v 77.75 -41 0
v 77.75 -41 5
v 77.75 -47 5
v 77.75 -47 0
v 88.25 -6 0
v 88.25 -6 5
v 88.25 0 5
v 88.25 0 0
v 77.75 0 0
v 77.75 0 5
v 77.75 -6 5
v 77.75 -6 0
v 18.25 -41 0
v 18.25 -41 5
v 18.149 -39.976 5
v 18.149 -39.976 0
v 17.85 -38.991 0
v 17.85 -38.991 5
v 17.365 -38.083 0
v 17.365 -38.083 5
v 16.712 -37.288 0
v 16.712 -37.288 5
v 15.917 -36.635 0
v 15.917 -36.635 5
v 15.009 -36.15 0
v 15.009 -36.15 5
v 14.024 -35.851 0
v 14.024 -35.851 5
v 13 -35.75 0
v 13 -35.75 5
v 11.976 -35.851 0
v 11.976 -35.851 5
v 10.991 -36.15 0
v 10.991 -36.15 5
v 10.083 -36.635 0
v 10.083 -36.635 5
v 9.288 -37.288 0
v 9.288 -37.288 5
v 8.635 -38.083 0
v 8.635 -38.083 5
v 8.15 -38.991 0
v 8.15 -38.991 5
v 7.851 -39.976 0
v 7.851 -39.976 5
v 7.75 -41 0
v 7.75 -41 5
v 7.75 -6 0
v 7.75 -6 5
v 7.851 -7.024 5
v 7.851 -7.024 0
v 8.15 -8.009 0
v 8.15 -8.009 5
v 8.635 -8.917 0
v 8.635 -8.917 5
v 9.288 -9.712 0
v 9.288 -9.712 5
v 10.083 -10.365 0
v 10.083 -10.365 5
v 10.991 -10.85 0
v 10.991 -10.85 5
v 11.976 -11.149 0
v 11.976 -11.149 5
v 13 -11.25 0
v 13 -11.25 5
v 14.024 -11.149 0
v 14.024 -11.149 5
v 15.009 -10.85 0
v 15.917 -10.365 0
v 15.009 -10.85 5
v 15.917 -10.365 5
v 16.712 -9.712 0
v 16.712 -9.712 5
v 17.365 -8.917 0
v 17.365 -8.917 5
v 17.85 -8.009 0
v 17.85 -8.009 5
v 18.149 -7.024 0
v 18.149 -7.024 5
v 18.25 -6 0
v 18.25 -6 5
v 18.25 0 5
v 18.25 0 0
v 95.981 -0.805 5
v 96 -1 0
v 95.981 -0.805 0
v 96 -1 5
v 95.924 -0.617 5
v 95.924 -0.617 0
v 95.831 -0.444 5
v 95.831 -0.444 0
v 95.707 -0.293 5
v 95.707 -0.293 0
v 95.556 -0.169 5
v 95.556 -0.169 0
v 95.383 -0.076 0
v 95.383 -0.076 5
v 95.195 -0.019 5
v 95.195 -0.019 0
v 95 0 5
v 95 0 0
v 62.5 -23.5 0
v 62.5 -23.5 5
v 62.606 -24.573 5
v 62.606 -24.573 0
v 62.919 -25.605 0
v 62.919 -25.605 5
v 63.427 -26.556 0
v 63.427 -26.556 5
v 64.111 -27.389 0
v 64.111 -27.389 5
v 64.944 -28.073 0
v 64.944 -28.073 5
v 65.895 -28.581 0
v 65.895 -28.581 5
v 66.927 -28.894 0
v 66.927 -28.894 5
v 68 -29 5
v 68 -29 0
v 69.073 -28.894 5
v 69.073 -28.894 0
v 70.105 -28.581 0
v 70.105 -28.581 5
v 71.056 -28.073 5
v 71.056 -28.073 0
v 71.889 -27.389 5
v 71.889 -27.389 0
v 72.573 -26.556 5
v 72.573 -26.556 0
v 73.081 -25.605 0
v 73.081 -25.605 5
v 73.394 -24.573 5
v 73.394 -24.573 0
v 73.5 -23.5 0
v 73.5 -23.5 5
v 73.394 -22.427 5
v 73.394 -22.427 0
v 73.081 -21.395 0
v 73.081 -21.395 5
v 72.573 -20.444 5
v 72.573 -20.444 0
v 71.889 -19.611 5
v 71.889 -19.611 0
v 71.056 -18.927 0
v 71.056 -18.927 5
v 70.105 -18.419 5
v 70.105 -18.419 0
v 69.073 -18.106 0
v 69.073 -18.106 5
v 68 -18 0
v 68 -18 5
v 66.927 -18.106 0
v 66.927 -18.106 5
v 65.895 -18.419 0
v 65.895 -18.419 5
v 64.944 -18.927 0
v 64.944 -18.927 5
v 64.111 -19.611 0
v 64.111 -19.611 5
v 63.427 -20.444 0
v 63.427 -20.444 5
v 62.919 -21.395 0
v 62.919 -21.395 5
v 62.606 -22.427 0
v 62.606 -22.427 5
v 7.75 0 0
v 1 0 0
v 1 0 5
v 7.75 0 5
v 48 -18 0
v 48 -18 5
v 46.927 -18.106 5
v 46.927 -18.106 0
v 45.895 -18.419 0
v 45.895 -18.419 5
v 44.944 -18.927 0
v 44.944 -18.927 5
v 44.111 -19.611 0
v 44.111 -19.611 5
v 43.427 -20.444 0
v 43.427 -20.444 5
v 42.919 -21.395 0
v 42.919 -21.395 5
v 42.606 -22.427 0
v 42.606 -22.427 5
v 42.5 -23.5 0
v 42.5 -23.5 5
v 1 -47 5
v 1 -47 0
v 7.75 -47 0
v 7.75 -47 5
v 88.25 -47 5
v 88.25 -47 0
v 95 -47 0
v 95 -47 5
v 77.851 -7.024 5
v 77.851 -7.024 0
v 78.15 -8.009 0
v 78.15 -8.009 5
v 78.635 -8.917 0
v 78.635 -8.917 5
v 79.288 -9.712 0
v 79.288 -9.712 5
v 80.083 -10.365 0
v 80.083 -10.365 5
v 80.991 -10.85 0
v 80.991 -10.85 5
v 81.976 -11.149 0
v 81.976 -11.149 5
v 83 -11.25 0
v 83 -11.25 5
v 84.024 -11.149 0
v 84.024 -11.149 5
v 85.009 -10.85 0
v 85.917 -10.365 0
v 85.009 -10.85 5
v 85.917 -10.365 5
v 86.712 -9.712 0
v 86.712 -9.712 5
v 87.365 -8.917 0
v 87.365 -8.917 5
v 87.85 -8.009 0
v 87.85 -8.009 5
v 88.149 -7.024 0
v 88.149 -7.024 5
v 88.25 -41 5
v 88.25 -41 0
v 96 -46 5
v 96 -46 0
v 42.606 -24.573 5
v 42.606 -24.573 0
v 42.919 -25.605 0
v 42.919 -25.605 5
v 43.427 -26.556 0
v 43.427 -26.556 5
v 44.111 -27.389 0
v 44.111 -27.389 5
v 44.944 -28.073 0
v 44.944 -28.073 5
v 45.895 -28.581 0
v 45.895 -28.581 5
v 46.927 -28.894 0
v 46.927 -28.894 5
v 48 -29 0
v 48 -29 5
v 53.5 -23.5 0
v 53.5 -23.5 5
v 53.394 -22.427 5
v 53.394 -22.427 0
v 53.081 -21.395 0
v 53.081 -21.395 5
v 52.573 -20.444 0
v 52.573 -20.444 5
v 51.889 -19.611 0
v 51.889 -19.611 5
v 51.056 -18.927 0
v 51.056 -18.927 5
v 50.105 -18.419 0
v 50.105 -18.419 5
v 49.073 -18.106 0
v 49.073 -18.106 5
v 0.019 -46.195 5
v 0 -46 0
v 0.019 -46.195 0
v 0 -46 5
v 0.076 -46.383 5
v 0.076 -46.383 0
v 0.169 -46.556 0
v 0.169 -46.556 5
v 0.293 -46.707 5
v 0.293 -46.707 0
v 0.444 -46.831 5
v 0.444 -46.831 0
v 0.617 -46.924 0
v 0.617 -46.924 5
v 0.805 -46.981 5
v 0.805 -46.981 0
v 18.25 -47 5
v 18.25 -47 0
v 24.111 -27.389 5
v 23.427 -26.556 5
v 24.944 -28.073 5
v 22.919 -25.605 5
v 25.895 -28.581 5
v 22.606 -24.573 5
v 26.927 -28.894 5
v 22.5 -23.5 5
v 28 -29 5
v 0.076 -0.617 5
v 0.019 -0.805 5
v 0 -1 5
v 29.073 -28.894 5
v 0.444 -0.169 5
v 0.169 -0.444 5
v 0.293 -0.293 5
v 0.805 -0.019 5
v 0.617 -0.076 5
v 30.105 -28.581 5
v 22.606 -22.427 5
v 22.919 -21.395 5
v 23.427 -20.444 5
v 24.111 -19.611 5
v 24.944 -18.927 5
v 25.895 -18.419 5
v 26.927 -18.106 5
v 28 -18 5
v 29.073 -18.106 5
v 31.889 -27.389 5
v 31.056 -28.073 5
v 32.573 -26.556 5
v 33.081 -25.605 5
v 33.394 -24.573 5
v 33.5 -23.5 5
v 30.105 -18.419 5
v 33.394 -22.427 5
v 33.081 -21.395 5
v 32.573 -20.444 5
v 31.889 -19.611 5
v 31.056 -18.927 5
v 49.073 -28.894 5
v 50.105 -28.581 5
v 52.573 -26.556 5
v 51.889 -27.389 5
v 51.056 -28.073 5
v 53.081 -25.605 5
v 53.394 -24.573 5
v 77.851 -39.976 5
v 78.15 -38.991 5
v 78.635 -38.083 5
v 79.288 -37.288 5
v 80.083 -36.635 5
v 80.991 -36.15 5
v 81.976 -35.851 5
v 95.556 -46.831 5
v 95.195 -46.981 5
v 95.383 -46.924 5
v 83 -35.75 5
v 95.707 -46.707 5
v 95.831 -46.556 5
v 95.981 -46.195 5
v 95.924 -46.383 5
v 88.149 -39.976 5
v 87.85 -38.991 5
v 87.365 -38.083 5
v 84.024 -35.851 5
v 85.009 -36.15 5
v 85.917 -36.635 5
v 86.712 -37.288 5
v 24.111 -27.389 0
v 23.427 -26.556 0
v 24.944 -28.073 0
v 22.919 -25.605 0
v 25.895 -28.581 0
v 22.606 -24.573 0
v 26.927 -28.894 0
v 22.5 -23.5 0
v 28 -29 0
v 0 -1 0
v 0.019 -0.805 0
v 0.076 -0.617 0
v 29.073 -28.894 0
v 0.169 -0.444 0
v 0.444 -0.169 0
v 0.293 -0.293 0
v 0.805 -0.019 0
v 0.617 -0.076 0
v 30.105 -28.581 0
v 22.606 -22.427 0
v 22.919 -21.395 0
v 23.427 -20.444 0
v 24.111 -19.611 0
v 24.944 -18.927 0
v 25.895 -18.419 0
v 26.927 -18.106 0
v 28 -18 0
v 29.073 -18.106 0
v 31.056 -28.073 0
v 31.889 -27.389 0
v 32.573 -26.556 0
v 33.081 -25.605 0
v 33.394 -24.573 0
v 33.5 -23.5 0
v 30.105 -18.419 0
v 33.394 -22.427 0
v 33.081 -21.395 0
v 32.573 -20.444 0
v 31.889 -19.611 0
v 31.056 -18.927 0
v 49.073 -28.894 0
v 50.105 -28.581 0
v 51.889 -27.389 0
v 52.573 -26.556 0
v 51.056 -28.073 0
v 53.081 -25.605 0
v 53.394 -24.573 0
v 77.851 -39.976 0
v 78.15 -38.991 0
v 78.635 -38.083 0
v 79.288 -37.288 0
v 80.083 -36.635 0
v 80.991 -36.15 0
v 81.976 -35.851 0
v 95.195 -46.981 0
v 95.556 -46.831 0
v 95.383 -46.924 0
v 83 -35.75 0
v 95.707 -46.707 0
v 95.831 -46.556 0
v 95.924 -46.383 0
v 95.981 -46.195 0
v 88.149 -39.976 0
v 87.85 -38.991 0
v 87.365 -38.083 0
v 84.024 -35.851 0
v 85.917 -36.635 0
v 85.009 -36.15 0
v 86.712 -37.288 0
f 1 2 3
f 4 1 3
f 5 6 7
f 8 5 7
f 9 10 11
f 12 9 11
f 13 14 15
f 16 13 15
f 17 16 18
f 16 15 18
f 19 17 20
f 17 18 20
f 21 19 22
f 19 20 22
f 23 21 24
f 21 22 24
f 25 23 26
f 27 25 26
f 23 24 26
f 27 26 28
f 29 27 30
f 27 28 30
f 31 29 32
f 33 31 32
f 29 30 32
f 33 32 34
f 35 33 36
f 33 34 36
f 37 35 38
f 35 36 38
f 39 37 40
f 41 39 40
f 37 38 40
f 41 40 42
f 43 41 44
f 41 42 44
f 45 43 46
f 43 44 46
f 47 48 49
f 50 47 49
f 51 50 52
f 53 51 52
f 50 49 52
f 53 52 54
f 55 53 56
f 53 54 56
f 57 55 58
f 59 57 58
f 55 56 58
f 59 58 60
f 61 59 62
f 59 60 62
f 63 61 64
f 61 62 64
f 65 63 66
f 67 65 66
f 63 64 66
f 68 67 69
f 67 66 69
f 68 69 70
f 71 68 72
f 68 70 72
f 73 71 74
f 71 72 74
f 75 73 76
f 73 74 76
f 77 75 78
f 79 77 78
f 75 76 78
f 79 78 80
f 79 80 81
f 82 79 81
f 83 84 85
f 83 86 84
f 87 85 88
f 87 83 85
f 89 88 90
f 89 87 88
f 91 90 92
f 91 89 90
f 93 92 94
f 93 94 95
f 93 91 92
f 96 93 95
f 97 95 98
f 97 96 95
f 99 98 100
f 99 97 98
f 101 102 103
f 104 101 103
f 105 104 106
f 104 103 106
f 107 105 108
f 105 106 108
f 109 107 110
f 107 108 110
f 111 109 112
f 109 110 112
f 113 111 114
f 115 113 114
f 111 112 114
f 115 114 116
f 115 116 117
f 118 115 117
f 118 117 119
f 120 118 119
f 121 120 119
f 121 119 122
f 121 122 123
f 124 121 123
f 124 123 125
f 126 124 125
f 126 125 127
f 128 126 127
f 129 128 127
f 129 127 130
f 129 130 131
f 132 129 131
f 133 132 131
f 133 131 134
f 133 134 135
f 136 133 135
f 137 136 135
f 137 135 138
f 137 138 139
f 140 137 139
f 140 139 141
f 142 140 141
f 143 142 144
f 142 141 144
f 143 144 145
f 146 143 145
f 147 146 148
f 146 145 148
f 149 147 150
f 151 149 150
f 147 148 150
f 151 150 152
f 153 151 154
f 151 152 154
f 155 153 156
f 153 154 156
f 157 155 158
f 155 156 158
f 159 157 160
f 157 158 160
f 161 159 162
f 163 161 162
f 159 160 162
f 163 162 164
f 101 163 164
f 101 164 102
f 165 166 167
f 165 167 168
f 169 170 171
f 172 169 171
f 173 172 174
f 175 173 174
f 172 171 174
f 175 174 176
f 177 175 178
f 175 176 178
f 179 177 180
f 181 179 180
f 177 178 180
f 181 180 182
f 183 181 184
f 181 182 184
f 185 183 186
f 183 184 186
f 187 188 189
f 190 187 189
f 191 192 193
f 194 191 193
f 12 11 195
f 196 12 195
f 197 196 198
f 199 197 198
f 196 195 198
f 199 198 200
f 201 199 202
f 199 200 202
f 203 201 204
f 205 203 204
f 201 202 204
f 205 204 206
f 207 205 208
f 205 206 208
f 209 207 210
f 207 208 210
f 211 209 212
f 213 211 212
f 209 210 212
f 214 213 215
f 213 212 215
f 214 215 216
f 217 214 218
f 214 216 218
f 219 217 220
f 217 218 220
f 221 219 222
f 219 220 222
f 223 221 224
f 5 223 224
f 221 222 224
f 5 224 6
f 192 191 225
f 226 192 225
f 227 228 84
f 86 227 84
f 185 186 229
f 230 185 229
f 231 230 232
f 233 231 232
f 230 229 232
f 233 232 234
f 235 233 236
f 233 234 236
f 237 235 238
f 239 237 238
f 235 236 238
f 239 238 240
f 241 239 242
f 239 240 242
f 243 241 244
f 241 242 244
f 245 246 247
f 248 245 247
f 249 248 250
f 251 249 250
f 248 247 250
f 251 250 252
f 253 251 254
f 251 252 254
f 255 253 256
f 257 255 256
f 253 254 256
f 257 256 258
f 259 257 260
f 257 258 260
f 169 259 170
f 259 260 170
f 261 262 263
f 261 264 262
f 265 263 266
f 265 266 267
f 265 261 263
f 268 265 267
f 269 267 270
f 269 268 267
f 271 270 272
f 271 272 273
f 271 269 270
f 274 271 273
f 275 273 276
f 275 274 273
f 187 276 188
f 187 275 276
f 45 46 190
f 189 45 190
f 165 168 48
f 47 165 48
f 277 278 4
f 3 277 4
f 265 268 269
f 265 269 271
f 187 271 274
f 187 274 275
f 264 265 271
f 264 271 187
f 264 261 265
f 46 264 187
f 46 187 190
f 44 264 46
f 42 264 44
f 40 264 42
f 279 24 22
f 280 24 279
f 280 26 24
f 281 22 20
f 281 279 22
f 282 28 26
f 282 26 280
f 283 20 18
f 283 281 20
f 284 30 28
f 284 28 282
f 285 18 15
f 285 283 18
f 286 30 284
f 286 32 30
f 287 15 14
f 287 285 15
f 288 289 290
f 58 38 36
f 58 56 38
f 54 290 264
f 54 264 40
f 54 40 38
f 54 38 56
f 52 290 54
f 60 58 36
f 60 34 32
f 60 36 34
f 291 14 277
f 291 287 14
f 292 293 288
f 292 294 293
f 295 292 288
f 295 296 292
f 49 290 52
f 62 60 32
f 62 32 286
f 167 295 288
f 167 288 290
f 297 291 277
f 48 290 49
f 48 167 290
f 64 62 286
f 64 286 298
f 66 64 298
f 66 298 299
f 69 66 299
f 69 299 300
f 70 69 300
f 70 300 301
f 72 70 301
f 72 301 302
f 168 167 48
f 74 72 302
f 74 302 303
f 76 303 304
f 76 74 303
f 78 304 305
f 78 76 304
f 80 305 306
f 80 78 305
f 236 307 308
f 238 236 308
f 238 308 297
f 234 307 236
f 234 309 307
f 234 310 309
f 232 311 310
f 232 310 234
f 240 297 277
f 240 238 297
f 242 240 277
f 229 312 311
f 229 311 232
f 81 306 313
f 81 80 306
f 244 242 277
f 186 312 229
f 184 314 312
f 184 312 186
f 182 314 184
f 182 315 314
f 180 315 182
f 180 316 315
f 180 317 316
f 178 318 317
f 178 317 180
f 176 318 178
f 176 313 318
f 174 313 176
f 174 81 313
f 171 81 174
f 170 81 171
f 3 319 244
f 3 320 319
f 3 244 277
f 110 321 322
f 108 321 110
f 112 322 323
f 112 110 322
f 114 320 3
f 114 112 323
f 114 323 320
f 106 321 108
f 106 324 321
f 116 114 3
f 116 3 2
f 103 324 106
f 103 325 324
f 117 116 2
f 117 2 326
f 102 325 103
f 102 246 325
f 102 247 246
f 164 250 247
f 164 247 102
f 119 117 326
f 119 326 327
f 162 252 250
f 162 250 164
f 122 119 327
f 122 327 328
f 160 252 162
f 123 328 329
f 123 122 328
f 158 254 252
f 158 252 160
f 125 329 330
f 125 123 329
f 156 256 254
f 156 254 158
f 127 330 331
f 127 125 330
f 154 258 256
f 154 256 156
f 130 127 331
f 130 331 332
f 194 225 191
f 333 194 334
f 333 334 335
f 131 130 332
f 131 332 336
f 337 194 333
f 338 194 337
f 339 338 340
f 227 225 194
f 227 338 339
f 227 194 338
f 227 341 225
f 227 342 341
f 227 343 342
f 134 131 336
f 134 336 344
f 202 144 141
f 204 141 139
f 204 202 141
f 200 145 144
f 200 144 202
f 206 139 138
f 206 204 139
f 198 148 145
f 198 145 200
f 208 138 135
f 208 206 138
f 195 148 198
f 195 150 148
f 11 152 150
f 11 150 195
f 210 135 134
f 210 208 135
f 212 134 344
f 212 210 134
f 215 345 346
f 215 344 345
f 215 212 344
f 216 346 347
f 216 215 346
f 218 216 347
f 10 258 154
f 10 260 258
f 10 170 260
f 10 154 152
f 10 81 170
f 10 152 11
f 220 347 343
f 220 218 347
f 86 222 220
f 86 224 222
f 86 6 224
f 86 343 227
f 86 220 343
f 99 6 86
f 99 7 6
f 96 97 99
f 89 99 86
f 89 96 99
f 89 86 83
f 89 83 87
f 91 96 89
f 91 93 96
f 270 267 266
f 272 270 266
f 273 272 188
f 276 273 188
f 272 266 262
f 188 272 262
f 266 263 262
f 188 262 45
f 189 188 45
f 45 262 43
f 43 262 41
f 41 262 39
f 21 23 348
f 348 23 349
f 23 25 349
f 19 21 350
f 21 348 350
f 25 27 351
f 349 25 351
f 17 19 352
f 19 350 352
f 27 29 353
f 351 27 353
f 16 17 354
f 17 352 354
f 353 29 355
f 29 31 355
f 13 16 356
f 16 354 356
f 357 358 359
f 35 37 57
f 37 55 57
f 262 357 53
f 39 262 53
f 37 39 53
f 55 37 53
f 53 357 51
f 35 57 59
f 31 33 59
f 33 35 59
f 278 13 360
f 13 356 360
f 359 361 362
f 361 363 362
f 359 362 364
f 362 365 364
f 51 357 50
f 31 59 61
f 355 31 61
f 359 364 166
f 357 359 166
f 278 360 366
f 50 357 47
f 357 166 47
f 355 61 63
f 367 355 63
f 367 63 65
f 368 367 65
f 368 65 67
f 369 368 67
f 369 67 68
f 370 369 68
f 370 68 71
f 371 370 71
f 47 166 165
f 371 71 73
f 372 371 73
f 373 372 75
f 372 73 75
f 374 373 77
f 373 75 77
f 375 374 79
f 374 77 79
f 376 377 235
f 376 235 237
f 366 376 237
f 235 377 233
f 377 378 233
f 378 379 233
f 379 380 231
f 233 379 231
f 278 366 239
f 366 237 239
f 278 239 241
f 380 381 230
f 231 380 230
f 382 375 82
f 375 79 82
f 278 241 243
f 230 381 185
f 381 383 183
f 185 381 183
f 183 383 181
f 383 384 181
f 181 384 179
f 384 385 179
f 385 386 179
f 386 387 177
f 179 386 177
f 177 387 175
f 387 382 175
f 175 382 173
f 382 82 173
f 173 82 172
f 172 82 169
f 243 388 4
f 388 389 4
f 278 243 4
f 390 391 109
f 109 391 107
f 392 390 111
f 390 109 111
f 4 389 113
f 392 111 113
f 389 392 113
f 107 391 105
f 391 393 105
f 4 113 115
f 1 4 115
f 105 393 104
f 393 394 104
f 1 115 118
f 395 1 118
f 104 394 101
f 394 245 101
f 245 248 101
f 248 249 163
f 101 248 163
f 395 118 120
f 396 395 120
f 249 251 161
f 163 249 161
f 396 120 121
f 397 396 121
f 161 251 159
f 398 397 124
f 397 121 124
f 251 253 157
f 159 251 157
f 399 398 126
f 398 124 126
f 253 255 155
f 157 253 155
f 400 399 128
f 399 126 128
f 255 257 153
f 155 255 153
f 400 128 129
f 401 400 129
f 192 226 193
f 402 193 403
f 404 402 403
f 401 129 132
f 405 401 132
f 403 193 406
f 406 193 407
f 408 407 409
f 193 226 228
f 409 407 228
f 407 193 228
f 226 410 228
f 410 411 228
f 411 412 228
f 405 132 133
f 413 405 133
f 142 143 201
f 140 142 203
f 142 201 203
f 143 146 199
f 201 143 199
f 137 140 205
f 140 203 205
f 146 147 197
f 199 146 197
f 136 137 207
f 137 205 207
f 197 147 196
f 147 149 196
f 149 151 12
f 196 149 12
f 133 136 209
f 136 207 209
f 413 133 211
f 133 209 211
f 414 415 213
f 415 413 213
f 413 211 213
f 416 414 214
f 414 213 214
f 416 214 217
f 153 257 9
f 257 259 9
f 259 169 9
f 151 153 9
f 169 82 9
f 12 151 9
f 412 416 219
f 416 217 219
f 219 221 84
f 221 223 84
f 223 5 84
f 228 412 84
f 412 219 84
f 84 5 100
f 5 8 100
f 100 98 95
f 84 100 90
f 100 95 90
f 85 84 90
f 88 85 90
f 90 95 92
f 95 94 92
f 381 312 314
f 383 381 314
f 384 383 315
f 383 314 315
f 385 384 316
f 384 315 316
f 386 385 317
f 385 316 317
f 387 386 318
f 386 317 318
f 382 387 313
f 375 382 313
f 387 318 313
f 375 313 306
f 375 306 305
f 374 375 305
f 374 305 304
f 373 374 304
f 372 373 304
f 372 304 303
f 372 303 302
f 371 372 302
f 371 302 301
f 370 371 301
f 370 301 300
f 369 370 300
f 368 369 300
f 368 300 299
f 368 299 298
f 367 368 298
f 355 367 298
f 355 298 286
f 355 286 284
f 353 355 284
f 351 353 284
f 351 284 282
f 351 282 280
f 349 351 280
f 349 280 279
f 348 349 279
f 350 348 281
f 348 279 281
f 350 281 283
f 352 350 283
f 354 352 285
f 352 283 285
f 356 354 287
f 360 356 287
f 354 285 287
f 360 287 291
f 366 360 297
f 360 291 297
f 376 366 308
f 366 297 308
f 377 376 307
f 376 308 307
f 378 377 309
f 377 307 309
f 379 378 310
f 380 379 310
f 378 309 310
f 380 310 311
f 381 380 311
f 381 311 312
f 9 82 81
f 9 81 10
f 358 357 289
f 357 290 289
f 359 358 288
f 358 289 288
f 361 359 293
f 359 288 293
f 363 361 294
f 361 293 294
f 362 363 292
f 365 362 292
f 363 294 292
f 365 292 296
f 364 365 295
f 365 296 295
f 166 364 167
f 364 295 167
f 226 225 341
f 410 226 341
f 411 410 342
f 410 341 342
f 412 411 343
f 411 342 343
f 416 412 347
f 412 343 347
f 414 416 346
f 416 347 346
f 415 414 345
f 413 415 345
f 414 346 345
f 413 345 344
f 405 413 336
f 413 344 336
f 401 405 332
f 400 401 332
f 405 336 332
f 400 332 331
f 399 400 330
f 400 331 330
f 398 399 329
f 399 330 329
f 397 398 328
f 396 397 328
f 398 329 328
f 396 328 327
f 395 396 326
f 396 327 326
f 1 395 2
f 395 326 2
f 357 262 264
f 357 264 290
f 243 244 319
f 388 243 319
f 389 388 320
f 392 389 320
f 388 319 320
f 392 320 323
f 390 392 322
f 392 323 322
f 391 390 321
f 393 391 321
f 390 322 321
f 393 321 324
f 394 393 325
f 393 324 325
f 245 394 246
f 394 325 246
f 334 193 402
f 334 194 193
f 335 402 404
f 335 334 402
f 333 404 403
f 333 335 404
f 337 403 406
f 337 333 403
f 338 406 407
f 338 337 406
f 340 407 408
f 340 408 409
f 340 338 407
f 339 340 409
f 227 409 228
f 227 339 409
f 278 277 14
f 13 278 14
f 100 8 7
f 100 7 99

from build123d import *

# Parameters (mm, degrees)
SKETCH_1_W          = 96
SKETCH_1_H          = 47
EXTRUDE_1_DEPTH     = 5
FILLET_1_R          = 1
CUT_EXTRUDE_2_DEPTH = 10
SKETCH_2_R          = 5.25
CUT_EXTRUDE_3_DEPTH = 10


with BuildPart() as part:
    # 草图1 → 凸台-拉伸1 (new body)
    with BuildSketch(Plane.XY):
        with Locations((48, -23.5)):
            Rectangle(SKETCH_1_W, SKETCH_1_H)
    extrude(amount=EXTRUDE_1_DEPTH)

    # 圆角1
    fillet_1_edges = [part.edges().sort_by_distance(p)[0] for p in [
        (0, 0, 2.5),
        (96, 0, 2.5),
        (96, -47, 2.5),
        (0, -47, 2.5),
    ]]
    fillet(fillet_1_edges, radius=FILLET_1_R)

    # 草图8 → 切除-拉伸2 (cut)
    with BuildSketch(Plane.XY.offset(5)):
        with BuildLine():
            ThreePointArc((22.5, -23.5), (28, -29), (33.5, -23.5))
            Line((33.5, -23.5), (22.5, -23.5))
        make_face()
        with BuildLine():
            Line((22.5, -23.5), (33.5, -23.5))
            ThreePointArc((33.5, -23.5), (28, -18), (22.5, -23.5))
        make_face()
        with BuildLine():
            ThreePointArc((42.5, -23.5), (44.110912703, -27.389087297), (48, -29))
            Line((48, -29), (48, -23.5))
            Line((48, -23.5), (42.5, -23.5))
        make_face()
        with BuildLine():
            Line((48, -23.5), (48, -29))
            ThreePointArc((48, -29), (51.889087297, -27.389087297), (53.5, -23.5))
            Line((53.5, -23.5), (48, -23.5))
        make_face()
        with BuildLine():
            Line((42.5, -23.5), (48, -23.5))
            Line((48, -23.5), (48, -18))
            ThreePointArc((48, -18), (44.110912703, -19.610912703), (42.5, -23.5))
        make_face()
        with BuildLine():
            Line((48, -18), (48, -23.5))
            Line((48, -23.5), (53.5, -23.5))
            ThreePointArc((53.5, -23.5), (51.889087297, -19.610912703), (48, -18))
        make_face()
        with BuildLine():
            ThreePointArc((73.5, -23.5), (68, -18), (62.5, -23.5))
            Line((62.5, -23.5), (73.5, -23.5))
        make_face()
        with BuildLine():
            Line((73.5, -23.5), (62.5, -23.5))
            ThreePointArc((62.5, -23.5), (68, -29), (73.5, -23.5))
        make_face()
    extrude(amount=-CUT_EXTRUDE_2_DEPTH, mode=Mode.SUBTRACT)

    # 草图2 → 切除-拉伸3 (cut)
    with BuildSketch(Plane.XY.offset(5)):
        with Locations((83, -6)):
            Circle(SKETCH_2_R)
        with Locations((13, -6)):
            Circle(SKETCH_2_R)
        with Locations((13, -41)):
            Circle(SKETCH_2_R)
        with Locations((83, -41)):
            Circle(SKETCH_2_R)
        with BuildLine():
            Line((18.25, -6), (18.25, 0))
            Line((18.25, 0), (7.75, 0))
            Line((7.75, 0), (7.75, -6))
            ThreePointArc((7.75, -6), (13, -0.75), (18.25, -6))
        make_face()
        with BuildLine():
            Line((7.75, -47), (18.25, -47))
            Line((18.25, -47), (18.25, -41))
            ThreePointArc((18.25, -41), (13, -46.25), (7.75, -41))
            Line((7.75, -41), (7.75, -47))
        make_face()
        with BuildLine():
            Line((77.75, -41), (77.75, -47))
            Line((77.75, -47), (88.25, -47))
            Line((88.25, -47), (88.25, -41))
            ThreePointArc((88.25, -41), (83, -46.25), (77.75, -41))
        make_face()
        with BuildLine():
            Line((88.25, 0), (77.75, 0))
            Line((77.75, 0), (77.75, -6))
            ThreePointArc((77.75, -6), (83, -0.75), (88.25, -6))
            Line((88.25, -6), (88.25, 0))
        make_face()
    extrude(amount=-CUT_EXTRUDE_3_DEPTH, mode=Mode.SUBTRACT)


solid = part.part
